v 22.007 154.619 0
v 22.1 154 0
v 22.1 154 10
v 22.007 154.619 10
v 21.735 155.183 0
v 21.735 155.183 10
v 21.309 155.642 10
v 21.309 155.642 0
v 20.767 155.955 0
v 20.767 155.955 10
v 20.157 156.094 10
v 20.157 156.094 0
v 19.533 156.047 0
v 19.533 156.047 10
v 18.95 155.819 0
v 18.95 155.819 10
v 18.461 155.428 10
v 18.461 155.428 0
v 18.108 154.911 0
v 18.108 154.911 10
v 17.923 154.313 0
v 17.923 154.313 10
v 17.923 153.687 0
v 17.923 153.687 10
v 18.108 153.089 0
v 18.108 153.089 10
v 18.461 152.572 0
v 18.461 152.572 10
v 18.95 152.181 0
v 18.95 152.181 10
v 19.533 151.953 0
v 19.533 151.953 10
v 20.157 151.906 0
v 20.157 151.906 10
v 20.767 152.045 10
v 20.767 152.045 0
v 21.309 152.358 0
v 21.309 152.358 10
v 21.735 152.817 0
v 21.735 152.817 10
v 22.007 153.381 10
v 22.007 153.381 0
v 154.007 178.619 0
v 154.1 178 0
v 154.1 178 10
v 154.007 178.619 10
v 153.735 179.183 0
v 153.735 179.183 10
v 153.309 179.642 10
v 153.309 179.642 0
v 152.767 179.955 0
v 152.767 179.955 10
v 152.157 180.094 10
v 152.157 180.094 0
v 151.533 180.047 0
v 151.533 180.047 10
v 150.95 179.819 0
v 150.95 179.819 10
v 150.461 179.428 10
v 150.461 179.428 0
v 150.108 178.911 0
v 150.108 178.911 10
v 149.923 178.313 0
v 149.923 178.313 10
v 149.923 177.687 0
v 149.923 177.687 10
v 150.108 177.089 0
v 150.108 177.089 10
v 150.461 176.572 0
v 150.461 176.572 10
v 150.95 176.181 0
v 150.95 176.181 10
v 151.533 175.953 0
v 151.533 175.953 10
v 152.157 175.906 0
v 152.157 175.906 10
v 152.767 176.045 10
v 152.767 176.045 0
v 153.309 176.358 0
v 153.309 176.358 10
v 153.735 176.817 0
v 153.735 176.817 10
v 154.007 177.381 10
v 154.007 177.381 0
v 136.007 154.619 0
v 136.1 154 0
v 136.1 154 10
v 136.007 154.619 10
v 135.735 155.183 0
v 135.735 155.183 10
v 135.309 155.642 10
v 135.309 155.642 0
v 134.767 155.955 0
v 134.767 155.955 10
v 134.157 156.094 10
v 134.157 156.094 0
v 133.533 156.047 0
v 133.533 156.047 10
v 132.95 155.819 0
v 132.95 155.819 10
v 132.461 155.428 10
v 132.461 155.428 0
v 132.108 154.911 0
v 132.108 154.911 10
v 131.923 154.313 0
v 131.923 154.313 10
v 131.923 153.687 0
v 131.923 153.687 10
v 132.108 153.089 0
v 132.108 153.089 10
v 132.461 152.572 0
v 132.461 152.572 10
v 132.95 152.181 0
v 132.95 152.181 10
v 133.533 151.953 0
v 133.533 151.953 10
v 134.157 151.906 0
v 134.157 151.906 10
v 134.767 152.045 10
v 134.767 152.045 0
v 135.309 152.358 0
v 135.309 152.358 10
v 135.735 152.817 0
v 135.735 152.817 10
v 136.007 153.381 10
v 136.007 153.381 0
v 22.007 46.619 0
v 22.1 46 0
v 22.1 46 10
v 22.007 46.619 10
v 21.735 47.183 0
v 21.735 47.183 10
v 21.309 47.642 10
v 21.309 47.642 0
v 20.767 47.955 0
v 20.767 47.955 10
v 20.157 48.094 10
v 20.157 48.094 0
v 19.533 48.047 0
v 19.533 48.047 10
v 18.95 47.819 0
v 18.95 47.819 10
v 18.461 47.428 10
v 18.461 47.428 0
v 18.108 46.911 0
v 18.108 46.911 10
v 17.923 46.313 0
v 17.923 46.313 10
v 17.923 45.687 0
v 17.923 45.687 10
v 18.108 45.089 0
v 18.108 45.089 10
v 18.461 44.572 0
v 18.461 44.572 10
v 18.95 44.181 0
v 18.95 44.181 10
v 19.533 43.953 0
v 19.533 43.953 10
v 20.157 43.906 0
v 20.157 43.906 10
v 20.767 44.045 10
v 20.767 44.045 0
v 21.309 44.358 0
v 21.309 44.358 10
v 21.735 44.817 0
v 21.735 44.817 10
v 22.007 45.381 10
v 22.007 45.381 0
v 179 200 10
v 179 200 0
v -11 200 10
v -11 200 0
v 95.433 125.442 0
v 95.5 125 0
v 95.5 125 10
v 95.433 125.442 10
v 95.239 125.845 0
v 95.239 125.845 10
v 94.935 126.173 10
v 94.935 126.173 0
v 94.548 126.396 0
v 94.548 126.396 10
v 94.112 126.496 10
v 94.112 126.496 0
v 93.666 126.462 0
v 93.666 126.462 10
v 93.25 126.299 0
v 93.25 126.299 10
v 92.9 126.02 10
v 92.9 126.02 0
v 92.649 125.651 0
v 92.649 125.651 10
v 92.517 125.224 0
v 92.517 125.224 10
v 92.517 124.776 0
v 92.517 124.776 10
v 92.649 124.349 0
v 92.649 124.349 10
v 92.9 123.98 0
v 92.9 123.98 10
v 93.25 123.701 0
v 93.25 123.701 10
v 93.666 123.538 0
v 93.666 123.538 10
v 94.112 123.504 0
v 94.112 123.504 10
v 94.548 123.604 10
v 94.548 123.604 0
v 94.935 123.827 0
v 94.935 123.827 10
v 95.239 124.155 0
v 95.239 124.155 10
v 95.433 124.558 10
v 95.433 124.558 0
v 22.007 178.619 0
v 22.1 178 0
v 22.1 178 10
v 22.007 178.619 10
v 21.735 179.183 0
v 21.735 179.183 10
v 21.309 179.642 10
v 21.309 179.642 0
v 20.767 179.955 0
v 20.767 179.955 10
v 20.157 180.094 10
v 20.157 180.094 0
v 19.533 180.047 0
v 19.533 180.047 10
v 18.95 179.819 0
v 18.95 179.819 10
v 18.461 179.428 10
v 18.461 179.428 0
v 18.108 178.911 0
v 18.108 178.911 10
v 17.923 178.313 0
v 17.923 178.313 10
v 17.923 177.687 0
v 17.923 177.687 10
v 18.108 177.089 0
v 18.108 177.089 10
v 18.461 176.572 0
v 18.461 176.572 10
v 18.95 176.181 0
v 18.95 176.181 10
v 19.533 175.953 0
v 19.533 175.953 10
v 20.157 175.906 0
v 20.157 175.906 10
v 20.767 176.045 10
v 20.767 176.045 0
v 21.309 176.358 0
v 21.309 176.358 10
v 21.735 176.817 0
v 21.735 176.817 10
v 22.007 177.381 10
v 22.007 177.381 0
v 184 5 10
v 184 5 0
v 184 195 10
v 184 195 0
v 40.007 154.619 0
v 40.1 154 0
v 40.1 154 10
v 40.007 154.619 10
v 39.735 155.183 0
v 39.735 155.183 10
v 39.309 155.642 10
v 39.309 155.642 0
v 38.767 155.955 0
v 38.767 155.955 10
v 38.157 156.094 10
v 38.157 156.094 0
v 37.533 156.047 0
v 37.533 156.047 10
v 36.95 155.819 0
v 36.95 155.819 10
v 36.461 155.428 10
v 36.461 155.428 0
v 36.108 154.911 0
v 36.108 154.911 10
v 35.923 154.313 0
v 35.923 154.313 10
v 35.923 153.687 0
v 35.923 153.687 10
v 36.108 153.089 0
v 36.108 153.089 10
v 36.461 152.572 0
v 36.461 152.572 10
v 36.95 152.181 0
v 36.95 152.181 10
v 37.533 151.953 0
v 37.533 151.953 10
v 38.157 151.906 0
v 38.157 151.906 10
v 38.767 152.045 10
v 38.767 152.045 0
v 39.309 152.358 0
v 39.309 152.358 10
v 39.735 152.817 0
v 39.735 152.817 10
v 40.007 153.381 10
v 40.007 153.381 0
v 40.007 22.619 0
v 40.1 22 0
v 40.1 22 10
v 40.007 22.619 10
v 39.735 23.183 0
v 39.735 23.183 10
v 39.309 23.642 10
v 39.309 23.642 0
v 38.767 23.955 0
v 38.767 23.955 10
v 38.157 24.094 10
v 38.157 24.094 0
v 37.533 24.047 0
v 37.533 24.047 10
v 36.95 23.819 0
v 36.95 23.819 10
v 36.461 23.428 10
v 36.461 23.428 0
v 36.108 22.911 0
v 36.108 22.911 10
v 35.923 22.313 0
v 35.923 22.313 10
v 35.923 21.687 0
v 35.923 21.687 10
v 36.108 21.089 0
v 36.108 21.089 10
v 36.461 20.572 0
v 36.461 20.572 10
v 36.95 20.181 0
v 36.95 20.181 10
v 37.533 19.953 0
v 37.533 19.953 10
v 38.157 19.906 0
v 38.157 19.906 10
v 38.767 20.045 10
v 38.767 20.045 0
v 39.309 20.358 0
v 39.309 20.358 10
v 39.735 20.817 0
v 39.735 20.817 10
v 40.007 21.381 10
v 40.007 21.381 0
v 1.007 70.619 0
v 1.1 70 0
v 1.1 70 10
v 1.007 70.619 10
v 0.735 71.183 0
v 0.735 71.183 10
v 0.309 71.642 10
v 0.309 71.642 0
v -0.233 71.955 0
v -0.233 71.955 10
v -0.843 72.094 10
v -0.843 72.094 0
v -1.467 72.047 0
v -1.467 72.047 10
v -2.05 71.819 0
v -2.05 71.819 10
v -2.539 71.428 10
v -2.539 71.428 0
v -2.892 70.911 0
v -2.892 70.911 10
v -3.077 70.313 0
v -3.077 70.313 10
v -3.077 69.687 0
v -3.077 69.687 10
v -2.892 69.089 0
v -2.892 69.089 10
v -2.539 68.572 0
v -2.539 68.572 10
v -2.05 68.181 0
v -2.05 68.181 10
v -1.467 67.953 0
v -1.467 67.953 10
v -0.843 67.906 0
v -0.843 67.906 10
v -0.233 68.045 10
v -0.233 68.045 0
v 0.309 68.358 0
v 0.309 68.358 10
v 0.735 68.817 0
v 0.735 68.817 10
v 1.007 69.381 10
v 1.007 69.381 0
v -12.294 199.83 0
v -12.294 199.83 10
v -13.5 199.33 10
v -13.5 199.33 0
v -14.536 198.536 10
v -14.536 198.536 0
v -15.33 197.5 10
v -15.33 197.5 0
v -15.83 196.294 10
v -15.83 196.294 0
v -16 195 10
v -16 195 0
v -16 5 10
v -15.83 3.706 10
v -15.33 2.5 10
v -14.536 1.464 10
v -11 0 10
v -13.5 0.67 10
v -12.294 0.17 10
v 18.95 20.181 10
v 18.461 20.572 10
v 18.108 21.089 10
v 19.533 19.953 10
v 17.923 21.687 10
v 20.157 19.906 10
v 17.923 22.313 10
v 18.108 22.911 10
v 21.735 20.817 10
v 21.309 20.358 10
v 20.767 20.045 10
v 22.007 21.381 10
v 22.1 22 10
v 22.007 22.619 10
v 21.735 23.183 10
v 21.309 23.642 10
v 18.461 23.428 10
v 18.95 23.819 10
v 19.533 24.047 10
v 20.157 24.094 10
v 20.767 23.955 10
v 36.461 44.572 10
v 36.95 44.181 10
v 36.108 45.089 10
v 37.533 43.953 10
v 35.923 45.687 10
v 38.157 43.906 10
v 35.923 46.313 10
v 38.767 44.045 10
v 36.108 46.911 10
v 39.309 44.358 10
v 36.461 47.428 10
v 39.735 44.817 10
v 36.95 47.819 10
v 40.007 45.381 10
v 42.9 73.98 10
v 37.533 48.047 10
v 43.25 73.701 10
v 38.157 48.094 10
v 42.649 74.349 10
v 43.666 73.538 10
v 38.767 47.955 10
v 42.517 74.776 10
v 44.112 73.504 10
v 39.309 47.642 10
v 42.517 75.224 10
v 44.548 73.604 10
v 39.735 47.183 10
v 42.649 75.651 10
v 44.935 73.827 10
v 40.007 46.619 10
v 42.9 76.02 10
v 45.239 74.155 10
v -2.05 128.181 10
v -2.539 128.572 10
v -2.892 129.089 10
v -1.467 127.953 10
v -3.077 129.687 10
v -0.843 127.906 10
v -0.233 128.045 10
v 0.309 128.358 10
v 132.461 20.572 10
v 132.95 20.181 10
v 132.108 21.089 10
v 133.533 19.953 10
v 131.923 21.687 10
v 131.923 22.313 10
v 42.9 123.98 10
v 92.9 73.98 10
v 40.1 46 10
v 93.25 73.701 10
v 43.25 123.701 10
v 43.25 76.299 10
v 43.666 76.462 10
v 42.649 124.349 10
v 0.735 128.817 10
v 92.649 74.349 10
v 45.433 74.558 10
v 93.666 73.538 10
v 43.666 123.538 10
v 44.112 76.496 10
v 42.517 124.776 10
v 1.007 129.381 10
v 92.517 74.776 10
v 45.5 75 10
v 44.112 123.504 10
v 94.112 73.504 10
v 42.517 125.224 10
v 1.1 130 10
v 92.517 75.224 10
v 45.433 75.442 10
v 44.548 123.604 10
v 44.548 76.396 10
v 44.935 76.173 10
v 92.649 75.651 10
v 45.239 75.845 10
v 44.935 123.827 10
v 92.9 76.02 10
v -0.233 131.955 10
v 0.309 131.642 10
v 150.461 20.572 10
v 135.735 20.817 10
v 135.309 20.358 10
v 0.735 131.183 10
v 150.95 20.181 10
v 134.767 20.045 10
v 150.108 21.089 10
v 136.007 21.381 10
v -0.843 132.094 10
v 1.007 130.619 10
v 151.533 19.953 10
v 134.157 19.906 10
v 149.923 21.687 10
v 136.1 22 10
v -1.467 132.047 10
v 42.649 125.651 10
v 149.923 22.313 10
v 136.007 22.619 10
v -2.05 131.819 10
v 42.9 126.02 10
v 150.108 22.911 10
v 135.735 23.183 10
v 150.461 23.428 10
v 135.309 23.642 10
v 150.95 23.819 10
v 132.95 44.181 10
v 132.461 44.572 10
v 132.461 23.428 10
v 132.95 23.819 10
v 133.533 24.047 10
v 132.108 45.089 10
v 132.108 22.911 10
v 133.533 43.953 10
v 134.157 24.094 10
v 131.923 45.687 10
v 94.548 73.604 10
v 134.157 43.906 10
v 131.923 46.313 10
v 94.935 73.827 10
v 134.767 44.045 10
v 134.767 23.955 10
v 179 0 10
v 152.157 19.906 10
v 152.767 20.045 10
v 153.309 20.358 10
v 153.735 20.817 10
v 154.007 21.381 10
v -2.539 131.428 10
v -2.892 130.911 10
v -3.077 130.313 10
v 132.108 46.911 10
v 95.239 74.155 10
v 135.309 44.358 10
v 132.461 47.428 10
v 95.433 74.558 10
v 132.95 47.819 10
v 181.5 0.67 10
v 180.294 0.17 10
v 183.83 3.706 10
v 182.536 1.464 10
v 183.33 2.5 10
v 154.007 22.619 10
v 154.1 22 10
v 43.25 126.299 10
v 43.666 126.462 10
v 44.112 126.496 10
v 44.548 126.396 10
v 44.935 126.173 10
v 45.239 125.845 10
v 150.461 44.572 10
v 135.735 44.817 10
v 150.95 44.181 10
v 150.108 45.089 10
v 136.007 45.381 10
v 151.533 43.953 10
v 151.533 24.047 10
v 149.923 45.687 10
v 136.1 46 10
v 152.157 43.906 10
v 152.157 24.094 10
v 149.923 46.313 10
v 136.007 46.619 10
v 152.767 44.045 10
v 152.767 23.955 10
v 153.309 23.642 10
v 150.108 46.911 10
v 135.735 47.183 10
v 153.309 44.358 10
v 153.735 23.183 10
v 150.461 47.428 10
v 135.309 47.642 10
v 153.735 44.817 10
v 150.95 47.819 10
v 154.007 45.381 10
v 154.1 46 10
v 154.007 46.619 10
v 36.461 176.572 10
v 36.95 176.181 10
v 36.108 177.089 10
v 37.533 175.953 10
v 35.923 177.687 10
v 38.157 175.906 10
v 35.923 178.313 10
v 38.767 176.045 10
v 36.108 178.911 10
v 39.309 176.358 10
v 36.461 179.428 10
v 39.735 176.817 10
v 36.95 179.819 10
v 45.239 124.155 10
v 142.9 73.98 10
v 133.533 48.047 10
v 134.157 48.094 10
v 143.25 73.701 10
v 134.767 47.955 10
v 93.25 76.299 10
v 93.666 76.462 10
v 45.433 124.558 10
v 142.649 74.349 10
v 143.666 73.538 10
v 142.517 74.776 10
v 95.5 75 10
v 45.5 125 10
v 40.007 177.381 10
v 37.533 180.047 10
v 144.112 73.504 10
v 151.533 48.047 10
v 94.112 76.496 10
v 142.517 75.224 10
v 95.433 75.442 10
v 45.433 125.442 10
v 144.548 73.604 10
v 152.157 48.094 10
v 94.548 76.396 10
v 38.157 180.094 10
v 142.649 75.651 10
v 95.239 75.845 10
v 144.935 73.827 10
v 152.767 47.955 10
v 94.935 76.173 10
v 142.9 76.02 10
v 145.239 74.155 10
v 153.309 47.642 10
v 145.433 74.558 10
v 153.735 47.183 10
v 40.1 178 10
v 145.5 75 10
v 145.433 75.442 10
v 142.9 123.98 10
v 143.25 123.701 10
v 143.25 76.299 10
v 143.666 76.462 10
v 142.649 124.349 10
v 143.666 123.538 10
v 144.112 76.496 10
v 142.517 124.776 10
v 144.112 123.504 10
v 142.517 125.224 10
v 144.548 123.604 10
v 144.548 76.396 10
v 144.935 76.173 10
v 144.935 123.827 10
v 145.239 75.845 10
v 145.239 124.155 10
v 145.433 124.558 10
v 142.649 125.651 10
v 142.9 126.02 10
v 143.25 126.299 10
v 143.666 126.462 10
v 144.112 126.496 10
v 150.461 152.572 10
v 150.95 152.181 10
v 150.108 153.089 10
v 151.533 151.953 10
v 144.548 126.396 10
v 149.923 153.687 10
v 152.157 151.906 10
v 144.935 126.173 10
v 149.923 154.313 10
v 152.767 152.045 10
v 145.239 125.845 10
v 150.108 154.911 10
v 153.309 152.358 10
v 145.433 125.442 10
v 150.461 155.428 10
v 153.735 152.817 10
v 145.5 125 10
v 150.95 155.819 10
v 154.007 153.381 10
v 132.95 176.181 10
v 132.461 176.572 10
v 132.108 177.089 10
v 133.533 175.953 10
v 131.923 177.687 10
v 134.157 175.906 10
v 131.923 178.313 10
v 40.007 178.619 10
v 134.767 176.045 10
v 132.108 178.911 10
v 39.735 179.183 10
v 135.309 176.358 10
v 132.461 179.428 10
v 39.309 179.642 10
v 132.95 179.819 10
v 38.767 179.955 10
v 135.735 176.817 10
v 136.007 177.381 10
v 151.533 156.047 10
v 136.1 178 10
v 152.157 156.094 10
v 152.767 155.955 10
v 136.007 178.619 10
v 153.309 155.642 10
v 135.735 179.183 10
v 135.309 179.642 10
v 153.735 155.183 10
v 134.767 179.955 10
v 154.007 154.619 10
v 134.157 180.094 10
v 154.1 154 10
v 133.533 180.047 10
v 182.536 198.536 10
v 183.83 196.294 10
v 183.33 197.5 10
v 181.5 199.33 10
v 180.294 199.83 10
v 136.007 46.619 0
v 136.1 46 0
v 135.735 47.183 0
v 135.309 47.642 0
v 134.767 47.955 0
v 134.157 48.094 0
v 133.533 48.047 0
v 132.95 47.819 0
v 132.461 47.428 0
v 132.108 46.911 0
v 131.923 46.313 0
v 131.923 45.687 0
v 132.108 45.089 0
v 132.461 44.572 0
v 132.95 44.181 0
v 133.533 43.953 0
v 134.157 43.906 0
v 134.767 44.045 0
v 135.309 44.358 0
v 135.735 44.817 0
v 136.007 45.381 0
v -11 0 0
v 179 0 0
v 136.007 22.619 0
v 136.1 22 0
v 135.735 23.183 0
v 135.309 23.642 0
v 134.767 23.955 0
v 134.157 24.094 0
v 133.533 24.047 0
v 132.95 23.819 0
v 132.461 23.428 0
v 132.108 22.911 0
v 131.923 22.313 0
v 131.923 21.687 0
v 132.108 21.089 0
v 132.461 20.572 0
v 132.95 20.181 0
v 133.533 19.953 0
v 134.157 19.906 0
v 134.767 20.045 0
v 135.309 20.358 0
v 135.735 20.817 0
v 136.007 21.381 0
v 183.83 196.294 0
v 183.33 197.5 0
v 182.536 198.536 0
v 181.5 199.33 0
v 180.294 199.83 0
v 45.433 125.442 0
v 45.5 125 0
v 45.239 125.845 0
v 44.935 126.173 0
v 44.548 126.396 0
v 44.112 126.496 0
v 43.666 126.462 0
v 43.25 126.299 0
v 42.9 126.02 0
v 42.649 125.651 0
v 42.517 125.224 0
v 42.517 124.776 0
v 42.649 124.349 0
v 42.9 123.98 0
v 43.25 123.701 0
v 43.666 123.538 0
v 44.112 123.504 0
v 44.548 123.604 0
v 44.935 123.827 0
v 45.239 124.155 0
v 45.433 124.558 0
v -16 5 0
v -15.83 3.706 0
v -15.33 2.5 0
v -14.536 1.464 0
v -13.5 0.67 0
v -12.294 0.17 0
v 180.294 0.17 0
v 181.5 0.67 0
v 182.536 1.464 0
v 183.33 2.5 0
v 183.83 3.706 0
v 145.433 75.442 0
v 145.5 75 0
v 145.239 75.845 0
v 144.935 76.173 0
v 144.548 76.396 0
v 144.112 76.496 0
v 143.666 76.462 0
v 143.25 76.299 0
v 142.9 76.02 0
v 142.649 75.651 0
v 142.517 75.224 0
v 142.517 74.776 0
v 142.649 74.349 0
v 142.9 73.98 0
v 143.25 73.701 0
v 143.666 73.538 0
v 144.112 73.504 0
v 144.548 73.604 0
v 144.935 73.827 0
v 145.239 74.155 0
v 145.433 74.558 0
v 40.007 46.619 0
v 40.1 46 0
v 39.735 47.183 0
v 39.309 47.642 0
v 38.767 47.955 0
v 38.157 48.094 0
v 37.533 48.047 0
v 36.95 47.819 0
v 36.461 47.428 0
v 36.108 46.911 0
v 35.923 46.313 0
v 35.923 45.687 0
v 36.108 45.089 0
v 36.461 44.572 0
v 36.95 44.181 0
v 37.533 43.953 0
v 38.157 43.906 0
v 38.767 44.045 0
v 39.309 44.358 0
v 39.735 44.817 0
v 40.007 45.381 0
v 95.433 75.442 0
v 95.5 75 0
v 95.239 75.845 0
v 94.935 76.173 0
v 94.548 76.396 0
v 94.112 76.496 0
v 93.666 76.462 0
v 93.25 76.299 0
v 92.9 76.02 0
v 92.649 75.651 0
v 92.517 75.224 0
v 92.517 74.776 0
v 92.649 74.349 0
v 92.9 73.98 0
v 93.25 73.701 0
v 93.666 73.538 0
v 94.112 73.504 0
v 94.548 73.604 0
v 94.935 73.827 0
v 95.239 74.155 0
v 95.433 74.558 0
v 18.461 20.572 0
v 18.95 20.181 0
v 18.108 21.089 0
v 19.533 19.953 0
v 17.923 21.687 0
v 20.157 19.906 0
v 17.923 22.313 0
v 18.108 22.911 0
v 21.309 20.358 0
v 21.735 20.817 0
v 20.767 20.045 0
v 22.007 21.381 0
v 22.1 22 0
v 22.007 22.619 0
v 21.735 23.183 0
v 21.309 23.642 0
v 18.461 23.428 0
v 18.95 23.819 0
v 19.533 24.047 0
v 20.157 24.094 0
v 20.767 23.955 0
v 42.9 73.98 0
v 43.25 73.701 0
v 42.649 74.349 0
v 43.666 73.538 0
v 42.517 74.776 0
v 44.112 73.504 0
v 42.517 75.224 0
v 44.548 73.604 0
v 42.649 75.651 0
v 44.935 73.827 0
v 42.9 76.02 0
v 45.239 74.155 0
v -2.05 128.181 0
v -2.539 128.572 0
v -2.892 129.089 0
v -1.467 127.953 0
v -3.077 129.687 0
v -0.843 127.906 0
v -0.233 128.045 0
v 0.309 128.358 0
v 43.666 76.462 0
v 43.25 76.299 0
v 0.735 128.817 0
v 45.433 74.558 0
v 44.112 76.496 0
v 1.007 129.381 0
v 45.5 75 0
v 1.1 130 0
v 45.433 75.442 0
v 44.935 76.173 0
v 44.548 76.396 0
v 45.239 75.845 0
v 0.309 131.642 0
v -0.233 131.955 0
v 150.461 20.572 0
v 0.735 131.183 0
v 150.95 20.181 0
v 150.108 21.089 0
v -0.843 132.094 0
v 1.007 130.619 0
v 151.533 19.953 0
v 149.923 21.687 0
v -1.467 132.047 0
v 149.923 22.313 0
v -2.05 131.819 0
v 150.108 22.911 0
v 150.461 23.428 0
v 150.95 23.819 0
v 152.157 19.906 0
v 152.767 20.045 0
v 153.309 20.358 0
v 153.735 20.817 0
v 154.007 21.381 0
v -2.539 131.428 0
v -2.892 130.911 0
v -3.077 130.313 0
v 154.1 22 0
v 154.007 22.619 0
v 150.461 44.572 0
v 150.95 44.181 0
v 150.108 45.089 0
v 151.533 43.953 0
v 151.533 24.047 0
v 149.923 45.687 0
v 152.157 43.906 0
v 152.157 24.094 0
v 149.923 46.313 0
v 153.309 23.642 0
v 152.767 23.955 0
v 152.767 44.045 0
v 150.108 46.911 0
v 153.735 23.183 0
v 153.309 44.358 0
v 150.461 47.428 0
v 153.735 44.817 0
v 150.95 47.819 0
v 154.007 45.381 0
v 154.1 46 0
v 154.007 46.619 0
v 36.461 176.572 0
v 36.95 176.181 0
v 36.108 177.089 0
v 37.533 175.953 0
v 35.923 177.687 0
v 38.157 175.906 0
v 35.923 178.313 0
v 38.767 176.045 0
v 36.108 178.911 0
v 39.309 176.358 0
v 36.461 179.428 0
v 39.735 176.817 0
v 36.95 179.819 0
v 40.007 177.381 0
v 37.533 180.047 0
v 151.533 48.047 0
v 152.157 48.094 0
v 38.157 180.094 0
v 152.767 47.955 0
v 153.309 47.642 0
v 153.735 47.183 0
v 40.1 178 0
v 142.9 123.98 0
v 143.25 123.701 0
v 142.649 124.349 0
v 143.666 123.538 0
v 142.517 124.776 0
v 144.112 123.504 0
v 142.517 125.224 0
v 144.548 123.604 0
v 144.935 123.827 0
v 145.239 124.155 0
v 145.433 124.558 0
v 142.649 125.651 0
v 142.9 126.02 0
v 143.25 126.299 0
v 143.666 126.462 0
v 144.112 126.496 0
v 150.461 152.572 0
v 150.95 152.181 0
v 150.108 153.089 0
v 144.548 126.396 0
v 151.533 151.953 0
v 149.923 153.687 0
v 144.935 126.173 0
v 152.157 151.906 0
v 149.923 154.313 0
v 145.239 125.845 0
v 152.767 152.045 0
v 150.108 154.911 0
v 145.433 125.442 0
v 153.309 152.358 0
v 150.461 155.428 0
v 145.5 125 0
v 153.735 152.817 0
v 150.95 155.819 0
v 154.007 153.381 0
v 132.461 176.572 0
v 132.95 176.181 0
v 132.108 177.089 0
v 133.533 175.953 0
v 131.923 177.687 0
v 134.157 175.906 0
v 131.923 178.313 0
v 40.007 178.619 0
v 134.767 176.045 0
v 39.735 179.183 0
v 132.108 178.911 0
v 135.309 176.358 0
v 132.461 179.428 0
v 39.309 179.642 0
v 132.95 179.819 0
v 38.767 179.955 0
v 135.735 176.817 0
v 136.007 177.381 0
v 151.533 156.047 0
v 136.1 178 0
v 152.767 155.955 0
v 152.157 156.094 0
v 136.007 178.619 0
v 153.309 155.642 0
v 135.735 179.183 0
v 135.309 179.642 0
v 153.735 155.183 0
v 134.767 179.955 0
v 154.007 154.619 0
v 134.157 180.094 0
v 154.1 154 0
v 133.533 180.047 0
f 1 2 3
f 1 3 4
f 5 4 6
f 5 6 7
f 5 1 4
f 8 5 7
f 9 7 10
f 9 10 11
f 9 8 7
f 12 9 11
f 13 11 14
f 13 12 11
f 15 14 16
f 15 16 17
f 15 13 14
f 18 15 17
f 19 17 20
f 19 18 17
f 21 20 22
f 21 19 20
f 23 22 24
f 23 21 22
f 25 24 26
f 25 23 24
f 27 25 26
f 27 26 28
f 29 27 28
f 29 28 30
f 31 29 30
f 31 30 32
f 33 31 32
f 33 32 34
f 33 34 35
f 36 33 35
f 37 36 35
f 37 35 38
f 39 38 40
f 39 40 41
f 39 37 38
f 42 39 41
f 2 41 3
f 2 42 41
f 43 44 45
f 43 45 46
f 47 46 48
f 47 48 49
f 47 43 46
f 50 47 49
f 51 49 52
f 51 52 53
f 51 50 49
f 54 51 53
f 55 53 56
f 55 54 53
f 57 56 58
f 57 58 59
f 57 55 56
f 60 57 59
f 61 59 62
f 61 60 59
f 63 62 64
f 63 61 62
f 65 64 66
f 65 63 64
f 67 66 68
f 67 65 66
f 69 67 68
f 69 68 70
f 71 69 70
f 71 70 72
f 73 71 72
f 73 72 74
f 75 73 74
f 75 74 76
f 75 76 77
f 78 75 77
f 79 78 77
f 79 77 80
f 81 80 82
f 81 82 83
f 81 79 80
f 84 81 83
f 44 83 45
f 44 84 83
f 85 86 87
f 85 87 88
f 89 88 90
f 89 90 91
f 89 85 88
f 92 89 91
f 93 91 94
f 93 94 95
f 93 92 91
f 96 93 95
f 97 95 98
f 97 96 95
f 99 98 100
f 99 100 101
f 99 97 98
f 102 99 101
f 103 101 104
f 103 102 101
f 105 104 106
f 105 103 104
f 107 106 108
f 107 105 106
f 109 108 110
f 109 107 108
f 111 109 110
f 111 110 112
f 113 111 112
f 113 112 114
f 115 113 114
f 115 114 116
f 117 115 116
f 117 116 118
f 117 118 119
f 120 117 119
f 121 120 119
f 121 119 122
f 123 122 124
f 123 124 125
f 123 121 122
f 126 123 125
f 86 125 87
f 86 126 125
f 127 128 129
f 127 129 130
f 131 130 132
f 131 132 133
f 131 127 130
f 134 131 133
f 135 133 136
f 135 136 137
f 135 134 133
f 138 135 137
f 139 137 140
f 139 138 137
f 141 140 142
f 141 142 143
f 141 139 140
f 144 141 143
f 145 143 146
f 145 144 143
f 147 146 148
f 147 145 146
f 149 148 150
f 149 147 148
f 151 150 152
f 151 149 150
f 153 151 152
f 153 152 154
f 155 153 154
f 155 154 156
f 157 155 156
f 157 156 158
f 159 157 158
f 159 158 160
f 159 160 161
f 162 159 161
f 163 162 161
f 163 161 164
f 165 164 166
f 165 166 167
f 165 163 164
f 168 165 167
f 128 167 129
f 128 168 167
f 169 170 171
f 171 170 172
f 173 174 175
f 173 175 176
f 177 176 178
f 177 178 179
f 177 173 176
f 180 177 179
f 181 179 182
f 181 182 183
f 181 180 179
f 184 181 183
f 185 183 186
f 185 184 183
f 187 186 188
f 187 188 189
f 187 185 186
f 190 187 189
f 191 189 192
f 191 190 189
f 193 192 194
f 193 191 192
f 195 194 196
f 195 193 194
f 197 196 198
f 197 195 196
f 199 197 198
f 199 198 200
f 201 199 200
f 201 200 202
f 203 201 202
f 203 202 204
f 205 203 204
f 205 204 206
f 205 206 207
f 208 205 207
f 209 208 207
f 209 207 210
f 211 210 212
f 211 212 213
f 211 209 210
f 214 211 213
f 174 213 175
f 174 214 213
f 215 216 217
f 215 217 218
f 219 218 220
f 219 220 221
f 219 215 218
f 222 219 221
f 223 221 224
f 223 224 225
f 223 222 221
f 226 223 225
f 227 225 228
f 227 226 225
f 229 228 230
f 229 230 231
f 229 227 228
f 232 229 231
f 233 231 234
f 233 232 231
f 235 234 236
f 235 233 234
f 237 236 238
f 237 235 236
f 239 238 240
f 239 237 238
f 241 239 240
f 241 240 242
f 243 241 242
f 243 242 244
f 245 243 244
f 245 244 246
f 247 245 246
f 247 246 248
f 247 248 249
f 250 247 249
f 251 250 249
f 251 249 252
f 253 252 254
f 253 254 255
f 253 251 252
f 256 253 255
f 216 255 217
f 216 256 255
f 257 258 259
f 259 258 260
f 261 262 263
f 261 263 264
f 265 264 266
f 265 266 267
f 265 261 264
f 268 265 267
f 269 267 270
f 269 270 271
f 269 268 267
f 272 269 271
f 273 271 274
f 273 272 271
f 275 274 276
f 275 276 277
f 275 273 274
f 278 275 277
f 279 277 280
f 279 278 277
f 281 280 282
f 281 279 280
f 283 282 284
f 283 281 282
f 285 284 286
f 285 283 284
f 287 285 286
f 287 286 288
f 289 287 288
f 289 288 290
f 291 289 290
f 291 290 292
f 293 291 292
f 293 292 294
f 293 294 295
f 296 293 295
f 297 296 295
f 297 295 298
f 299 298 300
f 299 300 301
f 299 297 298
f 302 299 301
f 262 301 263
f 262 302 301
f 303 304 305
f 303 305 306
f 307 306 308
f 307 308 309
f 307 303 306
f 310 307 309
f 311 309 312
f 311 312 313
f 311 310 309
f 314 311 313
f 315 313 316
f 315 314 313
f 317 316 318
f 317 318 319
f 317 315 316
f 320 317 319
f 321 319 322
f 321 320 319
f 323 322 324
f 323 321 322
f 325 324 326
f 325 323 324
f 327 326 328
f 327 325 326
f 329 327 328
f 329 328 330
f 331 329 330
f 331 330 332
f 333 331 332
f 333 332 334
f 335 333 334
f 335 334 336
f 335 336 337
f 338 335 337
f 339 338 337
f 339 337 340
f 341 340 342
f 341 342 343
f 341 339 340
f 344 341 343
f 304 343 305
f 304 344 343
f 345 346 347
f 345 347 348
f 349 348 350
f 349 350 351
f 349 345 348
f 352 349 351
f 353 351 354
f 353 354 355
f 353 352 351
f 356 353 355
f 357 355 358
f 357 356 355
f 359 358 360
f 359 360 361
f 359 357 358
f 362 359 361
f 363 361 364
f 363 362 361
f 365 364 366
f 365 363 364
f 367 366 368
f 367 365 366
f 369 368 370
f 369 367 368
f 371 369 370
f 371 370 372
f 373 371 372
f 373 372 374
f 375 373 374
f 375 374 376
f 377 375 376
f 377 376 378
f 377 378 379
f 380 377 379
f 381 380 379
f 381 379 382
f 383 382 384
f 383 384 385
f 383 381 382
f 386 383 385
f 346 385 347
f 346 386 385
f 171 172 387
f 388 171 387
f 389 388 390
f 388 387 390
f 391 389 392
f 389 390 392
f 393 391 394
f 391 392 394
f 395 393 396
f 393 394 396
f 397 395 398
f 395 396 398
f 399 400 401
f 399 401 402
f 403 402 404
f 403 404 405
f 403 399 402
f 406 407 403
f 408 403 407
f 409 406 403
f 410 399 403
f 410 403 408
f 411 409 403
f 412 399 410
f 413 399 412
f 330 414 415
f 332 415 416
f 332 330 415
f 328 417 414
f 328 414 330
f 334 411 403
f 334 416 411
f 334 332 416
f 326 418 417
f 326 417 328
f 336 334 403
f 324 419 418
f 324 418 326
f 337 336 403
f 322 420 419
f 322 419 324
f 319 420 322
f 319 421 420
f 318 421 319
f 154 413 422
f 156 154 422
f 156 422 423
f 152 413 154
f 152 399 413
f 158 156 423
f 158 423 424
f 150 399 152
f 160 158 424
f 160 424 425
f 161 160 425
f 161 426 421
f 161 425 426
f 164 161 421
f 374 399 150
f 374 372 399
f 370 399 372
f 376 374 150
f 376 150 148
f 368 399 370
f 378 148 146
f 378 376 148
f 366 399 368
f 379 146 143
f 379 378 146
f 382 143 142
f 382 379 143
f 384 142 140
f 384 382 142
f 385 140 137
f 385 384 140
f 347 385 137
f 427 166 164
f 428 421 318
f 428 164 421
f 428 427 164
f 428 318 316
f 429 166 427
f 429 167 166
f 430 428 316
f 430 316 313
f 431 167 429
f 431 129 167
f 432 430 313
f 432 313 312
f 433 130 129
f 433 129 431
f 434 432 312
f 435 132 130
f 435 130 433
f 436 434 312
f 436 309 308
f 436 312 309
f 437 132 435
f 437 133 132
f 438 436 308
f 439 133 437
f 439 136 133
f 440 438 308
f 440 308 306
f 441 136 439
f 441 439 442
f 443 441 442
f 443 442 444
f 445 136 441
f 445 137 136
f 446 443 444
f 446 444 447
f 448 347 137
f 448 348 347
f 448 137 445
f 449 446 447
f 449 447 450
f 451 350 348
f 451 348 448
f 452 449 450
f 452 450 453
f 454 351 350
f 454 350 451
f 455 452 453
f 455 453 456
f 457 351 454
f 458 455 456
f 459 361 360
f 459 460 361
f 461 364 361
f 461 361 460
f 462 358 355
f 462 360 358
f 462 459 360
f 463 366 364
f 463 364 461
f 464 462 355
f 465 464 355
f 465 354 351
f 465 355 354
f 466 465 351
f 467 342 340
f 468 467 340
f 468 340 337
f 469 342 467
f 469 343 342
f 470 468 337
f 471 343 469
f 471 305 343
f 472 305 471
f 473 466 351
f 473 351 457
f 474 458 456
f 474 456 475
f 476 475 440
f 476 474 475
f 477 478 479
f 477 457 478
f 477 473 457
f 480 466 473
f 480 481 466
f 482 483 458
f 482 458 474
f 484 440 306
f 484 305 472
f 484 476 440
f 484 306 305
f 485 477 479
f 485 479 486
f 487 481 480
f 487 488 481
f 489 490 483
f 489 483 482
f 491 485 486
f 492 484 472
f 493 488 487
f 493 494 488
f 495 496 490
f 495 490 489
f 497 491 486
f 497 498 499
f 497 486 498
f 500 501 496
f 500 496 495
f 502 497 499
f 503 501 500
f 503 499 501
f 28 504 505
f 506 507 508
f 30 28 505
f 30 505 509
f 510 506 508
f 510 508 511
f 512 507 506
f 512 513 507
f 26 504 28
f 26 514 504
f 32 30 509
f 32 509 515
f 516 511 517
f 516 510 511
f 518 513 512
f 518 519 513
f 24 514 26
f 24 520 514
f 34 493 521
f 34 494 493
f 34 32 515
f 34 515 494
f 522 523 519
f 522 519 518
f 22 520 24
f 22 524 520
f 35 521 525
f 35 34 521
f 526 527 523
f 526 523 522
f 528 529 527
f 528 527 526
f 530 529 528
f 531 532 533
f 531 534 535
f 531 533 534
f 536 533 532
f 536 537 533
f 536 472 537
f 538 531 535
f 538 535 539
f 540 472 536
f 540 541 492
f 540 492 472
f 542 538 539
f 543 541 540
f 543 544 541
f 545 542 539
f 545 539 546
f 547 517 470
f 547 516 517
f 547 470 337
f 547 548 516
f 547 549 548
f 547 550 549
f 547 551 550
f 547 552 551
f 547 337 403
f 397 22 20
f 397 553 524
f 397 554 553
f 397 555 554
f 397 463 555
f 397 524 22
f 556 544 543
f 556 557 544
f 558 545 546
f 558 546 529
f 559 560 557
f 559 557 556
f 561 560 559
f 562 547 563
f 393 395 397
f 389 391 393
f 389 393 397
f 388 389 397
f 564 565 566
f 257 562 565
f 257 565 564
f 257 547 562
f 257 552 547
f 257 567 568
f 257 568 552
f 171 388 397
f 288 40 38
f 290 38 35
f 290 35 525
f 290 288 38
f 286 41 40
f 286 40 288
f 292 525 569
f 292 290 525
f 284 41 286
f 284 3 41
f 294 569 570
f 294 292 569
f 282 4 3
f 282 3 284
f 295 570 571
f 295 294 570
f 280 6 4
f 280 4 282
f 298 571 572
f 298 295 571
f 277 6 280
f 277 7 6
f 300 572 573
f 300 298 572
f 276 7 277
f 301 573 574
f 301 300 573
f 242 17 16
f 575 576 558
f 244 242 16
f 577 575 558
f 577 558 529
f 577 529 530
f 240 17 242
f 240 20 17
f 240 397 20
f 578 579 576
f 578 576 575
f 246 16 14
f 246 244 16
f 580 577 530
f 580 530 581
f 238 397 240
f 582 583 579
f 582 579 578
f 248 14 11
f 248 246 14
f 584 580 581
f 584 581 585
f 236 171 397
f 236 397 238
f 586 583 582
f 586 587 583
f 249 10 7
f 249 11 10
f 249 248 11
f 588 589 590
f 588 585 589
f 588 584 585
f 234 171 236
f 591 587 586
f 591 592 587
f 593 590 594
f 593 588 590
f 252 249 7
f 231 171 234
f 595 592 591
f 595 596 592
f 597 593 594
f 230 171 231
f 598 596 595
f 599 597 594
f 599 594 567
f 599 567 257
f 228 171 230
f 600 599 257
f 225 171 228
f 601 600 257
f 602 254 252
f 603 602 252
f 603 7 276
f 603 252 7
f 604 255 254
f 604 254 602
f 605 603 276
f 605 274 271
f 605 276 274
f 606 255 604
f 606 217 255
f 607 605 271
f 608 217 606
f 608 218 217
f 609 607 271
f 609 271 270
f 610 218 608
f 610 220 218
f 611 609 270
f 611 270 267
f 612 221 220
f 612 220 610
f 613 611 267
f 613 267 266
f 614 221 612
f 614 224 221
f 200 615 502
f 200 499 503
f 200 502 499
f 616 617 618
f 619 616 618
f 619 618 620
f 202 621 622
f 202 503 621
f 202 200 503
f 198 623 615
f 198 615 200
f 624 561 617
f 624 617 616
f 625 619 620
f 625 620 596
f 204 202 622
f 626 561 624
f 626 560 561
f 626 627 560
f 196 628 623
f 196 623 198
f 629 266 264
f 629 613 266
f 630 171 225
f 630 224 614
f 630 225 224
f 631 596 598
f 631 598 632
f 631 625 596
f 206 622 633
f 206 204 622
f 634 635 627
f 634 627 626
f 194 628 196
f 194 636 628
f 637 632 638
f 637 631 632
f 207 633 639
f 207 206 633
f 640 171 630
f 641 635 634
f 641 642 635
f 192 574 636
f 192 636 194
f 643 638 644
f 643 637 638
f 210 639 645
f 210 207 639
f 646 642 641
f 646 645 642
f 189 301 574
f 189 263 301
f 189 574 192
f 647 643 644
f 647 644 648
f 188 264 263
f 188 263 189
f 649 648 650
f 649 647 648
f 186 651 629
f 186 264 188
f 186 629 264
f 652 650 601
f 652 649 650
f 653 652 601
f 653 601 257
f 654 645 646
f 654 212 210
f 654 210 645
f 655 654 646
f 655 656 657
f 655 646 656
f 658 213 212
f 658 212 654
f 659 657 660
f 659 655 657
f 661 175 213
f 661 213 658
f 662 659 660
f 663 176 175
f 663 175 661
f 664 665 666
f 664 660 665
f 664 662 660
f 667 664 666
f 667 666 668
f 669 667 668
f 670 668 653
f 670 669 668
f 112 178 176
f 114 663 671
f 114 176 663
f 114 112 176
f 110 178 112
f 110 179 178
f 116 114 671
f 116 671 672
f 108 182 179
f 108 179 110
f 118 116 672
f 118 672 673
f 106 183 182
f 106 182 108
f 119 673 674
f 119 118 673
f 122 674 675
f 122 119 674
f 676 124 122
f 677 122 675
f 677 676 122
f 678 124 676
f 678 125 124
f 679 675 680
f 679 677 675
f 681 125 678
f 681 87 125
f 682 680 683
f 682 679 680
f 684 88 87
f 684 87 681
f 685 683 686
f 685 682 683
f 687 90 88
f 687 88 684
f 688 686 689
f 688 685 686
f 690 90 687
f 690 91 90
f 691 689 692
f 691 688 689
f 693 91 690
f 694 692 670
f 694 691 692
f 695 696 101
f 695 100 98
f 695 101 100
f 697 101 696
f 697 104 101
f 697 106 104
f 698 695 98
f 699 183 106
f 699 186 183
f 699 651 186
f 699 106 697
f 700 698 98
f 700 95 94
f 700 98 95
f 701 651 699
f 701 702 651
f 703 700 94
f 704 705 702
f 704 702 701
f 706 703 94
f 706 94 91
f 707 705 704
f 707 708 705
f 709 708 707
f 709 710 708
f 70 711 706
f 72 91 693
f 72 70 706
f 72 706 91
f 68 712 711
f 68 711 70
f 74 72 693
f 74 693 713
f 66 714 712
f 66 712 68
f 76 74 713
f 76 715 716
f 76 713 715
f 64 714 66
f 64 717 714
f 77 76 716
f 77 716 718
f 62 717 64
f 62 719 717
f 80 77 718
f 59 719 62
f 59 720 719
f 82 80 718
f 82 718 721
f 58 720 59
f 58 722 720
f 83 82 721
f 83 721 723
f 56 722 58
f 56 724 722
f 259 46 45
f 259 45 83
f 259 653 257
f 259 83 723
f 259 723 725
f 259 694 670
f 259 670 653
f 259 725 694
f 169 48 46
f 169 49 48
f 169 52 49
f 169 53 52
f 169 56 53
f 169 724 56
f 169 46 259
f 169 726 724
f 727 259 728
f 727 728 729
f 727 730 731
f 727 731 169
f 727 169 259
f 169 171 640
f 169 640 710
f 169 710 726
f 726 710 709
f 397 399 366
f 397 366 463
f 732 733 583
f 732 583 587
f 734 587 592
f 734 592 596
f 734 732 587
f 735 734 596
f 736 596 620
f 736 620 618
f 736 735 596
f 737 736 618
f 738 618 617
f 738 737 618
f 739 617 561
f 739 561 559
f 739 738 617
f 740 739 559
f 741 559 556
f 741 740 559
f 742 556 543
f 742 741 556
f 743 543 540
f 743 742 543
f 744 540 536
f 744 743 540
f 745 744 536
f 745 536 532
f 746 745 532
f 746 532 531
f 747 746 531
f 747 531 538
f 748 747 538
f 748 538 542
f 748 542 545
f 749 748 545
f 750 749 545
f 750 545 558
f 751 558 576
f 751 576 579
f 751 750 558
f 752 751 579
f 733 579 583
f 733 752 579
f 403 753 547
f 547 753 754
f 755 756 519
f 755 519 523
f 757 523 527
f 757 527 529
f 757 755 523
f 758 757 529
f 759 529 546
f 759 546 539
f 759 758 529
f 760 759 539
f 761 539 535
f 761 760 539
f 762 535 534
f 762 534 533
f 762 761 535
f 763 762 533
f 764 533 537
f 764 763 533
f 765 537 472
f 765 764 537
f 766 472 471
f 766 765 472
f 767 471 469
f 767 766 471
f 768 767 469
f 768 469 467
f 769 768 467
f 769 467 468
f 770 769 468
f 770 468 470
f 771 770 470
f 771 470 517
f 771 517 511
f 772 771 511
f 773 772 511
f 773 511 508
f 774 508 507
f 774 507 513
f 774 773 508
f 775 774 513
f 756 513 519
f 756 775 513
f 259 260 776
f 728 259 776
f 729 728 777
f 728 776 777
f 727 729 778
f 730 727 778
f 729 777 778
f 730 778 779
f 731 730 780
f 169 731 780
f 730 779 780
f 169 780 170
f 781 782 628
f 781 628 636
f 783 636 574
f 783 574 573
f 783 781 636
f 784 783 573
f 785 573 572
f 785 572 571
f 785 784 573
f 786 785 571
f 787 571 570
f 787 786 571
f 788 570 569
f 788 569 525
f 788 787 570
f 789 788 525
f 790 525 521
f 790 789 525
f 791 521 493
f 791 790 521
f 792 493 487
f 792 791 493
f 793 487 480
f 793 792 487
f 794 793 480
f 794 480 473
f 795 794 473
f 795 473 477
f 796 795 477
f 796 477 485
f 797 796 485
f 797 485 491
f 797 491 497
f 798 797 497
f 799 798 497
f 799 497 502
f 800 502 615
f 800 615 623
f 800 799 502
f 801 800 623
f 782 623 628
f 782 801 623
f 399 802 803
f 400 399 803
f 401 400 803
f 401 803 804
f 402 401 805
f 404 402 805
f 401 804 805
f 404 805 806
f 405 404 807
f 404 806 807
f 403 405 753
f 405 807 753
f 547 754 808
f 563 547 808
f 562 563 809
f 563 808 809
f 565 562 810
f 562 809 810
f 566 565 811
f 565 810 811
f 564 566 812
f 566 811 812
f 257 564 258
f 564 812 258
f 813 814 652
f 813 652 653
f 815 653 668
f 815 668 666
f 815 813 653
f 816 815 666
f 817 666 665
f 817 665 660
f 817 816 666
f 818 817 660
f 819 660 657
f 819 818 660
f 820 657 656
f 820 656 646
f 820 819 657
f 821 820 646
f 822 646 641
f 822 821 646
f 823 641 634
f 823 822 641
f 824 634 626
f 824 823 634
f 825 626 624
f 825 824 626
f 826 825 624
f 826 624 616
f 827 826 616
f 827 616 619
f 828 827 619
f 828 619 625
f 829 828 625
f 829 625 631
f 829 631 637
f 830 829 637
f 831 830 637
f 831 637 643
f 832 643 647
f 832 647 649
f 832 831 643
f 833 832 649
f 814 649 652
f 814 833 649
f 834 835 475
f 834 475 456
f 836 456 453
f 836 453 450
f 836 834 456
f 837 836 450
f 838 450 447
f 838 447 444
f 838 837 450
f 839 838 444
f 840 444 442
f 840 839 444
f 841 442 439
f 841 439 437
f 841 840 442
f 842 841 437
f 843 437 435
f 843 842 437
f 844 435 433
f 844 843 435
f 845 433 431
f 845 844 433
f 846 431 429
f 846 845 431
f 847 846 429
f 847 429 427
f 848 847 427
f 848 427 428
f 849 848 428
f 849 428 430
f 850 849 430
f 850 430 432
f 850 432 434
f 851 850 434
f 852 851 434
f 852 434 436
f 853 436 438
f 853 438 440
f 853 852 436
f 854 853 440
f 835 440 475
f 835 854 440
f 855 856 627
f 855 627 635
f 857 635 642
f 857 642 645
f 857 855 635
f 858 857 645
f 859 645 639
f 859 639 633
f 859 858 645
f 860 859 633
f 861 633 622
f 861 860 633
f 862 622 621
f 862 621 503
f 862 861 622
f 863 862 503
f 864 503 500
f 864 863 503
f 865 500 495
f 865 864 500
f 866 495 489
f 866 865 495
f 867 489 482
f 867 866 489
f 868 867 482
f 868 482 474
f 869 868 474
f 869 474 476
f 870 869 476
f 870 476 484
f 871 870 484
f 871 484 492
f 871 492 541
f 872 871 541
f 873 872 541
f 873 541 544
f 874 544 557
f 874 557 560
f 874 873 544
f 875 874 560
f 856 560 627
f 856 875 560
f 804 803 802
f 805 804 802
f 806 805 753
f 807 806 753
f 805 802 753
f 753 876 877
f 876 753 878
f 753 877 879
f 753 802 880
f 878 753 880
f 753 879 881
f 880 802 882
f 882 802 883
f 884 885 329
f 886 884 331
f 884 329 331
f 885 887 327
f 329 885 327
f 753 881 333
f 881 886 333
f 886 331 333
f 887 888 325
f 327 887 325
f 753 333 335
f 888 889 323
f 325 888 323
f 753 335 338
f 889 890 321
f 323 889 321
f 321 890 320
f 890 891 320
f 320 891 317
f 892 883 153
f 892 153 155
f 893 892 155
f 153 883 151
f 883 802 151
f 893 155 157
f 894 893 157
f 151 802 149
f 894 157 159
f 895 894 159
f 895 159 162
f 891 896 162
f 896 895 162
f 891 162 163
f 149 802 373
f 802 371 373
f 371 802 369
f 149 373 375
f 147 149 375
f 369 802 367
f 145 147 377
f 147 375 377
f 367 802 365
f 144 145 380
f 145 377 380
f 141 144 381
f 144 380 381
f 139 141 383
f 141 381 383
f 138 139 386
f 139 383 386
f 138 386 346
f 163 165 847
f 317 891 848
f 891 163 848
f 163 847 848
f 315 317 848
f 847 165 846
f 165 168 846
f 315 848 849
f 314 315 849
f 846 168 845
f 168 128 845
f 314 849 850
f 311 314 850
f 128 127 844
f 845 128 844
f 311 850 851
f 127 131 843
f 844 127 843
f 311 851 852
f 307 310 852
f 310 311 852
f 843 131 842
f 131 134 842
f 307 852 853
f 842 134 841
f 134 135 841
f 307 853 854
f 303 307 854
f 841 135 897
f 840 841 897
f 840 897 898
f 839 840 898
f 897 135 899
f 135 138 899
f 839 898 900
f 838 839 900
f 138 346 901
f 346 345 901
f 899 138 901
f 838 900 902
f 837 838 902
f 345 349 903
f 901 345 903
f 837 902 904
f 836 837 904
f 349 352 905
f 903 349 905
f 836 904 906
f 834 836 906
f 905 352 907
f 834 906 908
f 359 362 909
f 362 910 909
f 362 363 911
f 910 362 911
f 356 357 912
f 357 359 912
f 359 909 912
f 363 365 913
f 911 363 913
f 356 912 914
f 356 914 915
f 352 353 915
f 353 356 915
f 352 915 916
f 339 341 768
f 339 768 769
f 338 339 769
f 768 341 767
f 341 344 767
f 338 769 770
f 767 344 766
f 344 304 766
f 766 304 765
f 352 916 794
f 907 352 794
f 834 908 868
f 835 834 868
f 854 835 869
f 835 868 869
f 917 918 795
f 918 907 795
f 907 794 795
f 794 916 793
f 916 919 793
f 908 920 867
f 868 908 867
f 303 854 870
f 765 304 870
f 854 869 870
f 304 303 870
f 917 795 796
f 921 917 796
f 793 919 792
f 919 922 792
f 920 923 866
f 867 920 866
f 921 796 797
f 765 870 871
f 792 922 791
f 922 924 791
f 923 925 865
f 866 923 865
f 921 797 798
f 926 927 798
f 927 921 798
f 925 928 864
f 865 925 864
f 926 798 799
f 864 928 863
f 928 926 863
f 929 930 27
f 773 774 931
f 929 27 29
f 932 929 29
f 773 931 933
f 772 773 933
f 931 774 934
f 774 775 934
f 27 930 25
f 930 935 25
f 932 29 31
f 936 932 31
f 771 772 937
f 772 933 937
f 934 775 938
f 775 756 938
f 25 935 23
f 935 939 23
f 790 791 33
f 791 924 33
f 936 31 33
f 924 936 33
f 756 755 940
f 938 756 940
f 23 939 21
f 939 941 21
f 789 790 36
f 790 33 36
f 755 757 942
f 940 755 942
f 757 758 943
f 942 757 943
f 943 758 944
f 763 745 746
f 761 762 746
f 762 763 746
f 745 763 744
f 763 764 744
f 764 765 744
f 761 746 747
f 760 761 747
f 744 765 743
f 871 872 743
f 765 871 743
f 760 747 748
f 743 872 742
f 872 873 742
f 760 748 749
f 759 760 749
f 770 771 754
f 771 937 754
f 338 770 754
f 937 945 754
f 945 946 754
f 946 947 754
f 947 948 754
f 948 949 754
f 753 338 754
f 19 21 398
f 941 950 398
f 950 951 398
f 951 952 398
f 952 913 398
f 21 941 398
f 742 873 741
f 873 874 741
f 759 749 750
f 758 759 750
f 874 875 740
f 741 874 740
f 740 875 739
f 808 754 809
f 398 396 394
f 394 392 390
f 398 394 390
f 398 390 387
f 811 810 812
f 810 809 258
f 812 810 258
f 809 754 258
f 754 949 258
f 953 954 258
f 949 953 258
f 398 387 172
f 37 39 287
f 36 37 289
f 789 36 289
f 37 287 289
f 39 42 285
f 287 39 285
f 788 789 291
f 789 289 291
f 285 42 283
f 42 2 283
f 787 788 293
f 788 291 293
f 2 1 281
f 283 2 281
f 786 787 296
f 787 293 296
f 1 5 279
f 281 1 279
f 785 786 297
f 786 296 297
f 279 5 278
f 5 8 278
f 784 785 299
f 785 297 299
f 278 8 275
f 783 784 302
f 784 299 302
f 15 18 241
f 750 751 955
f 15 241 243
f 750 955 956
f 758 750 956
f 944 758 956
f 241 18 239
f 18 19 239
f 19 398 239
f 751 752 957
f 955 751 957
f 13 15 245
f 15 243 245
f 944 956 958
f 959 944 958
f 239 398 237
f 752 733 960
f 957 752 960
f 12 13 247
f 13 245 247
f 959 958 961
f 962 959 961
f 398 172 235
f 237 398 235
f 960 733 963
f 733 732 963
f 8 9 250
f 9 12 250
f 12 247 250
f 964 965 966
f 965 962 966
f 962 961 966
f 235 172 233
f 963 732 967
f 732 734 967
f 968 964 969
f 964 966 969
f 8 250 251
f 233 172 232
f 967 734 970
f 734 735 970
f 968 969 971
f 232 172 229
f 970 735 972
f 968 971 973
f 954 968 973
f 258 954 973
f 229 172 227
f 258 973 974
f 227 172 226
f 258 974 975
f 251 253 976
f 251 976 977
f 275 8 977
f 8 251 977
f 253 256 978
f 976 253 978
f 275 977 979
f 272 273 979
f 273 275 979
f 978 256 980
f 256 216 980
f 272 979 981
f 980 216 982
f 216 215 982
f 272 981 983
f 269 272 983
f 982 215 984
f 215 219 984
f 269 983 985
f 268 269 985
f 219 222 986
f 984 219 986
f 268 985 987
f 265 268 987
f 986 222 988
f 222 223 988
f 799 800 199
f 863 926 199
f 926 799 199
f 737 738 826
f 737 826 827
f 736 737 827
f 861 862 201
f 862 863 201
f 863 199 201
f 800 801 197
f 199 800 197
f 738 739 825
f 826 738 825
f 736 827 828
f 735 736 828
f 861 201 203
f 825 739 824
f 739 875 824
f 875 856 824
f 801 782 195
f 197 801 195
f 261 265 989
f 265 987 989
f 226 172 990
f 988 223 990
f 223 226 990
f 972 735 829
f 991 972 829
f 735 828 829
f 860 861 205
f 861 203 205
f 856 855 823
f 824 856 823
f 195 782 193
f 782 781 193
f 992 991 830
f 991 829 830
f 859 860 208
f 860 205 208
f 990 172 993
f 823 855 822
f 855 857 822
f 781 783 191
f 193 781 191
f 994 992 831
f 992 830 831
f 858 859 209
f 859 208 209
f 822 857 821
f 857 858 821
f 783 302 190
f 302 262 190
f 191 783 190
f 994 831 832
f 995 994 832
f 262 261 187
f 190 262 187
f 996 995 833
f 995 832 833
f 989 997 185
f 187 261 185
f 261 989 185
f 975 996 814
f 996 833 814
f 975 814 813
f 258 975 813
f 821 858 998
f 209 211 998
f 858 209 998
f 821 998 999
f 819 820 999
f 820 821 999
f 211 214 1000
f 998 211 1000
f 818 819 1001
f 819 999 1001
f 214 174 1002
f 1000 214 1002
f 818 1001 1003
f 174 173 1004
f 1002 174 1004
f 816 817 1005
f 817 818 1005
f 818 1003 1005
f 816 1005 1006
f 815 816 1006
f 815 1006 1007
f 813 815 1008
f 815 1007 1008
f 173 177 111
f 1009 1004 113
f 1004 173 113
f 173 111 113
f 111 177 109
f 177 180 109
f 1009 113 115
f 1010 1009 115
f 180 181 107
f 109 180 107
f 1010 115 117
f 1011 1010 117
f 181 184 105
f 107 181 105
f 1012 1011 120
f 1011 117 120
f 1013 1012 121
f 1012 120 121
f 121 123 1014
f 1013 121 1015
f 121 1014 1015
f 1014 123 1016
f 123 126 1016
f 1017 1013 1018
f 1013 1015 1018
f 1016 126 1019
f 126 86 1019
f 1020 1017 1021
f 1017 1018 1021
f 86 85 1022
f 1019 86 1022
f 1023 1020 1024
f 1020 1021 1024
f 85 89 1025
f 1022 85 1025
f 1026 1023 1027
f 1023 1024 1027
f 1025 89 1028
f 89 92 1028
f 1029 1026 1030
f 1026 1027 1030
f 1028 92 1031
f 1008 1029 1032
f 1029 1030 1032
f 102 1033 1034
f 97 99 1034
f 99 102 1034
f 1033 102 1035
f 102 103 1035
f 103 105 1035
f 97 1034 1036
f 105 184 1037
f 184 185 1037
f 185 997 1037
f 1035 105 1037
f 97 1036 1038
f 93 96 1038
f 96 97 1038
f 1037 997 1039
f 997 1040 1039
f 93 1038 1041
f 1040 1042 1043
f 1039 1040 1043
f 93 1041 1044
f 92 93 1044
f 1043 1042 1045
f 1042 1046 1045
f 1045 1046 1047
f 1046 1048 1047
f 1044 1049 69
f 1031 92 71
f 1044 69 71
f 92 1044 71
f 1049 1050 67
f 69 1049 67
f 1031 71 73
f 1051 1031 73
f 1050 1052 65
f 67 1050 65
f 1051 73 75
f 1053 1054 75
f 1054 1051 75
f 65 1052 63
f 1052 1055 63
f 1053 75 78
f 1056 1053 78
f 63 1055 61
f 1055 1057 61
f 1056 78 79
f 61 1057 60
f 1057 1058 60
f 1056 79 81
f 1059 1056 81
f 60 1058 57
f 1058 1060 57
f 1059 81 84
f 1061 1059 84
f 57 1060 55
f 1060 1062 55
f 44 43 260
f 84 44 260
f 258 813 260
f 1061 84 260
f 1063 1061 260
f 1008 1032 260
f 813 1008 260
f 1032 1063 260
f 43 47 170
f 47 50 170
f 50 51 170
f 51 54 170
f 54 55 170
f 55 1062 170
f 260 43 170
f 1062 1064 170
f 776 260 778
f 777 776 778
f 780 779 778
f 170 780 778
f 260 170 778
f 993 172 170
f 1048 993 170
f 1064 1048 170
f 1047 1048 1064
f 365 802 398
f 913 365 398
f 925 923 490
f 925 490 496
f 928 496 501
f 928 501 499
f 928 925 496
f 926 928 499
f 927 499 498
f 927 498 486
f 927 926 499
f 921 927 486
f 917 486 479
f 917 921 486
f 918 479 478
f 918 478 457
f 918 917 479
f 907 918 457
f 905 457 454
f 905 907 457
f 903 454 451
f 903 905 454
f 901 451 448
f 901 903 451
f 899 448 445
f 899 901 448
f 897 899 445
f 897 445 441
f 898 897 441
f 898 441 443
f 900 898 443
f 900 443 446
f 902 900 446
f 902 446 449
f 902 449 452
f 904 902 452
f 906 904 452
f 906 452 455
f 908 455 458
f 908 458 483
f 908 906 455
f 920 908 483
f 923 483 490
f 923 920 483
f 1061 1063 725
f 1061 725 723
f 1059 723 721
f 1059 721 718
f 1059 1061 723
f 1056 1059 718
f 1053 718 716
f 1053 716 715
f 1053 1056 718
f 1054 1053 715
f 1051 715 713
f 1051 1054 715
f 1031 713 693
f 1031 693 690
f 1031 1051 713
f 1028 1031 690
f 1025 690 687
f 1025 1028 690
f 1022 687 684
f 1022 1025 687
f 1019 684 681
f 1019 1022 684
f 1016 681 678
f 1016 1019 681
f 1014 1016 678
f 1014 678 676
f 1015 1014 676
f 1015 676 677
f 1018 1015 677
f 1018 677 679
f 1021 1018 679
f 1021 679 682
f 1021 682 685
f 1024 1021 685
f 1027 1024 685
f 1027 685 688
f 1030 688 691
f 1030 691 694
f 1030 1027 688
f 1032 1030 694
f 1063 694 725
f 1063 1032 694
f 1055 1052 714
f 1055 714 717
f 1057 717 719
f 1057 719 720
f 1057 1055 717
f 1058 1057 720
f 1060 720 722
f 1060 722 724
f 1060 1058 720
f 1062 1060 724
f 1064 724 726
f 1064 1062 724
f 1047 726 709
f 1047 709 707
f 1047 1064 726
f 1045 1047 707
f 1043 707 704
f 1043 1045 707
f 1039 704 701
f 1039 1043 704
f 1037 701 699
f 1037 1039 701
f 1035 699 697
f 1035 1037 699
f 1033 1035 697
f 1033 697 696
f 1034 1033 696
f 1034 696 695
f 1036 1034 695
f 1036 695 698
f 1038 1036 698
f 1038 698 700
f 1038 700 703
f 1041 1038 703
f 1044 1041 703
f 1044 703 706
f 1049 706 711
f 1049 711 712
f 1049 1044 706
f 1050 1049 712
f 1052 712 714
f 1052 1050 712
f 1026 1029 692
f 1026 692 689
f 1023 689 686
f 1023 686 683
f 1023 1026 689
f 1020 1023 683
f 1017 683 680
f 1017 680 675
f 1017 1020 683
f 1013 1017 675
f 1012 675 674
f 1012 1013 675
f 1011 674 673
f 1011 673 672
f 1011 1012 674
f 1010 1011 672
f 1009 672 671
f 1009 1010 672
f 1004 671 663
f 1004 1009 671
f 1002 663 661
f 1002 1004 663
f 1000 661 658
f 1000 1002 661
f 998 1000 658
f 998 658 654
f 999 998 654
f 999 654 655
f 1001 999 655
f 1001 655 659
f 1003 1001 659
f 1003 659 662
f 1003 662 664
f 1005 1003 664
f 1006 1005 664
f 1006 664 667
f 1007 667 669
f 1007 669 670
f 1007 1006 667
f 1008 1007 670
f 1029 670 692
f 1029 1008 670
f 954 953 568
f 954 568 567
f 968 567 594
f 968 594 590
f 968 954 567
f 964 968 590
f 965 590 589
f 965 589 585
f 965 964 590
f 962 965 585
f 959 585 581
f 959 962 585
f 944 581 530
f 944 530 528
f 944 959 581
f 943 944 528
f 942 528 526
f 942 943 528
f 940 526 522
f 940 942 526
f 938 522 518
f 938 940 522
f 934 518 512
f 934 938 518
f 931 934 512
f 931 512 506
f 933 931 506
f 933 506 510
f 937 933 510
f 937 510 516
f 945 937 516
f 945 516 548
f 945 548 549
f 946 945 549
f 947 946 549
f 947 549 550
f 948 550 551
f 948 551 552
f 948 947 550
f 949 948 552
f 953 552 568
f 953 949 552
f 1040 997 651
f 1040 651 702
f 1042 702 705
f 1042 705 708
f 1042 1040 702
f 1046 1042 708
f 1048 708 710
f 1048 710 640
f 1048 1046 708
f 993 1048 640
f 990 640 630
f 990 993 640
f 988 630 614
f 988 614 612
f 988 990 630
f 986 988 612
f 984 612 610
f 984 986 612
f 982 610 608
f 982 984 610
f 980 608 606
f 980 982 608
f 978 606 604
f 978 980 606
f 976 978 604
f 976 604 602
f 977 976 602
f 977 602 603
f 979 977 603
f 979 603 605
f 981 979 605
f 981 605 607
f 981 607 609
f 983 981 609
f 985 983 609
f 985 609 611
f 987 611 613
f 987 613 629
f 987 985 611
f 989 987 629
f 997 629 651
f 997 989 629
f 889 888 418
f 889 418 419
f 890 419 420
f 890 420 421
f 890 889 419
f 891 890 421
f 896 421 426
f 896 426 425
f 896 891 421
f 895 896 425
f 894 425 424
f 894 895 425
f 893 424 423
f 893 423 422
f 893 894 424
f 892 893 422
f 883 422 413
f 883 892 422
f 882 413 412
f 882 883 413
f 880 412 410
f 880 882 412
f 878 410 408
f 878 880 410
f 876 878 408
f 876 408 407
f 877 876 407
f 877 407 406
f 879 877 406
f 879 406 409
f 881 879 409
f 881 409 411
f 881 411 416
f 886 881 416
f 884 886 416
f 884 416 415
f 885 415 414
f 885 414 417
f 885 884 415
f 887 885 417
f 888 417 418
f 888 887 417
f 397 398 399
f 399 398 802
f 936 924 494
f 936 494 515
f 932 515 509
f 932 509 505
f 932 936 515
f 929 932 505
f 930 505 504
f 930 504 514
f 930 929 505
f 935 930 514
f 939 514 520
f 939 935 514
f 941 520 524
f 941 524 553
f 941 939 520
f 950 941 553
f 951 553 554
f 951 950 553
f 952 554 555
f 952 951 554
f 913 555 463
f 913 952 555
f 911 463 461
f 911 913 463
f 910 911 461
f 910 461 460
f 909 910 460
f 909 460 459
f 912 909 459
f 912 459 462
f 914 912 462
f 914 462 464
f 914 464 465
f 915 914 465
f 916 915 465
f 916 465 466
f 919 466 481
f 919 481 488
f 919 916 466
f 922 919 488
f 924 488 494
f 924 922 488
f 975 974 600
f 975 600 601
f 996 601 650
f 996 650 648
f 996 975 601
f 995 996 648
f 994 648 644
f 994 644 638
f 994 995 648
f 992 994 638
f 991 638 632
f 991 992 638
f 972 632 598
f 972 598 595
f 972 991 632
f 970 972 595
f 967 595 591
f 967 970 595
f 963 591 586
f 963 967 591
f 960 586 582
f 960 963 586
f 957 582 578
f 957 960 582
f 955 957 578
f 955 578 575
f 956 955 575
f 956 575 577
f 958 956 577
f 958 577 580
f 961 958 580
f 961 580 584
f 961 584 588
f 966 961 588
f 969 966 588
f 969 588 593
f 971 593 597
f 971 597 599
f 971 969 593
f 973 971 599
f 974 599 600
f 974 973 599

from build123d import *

# Parameters (mm, degrees)
SKETCH2_R           = 2.1
SKETCH2_R_2         = 1.5
BOSS_EXTRUDE1_DEPTH = 10


with BuildPart() as part:
    # Sketch2 → Boss-Extrude1 (new body)
    with BuildSketch(Plane.XY):
        with BuildLine():
            Line((-11, 0), (179, 0))
            ThreePointArc((179, 0), (182.535533906, 1.464466094), (184, 5))
            Line((184, 5), (184, 195))
            ThreePointArc((184, 195), (182.535533906, 198.535533906), (179, 200))
            Line((179, 200), (-11, 200))
            ThreePointArc((-11, 200), (-14.535533906, 198.535533906), (-16, 195))
            Line((-16, 195), (-16, 5))
            ThreePointArc((-16, 5), (-14.535533906, 1.464466094), (-11, 0))
        make_face()
        with Locations((-1, 70)):
            Circle(SKETCH2_R, mode=Mode.SUBTRACT)
        with Locations((152, 178)):
            Circle(SKETCH2_R, mode=Mode.SUBTRACT)
        with Locations((152, 154)):
            Circle(SKETCH2_R, mode=Mode.SUBTRACT)
        with Locations((152, 22)):
            Circle(SKETCH2_R, mode=Mode.SUBTRACT)
        with Locations((152, 46)):
            Circle(SKETCH2_R, mode=Mode.SUBTRACT)
        with Locations((20, 178)):
            Circle(SKETCH2_R, mode=Mode.SUBTRACT)
        with Locations((38, 154)):
            Circle(SKETCH2_R, mode=Mode.SUBTRACT)
        with Locations((20, 22)):
            Circle(SKETCH2_R, mode=Mode.SUBTRACT)
        with Locations((38, 46)):
            Circle(SKETCH2_R, mode=Mode.SUBTRACT)
        with Locations((20, 46)):
            Circle(SKETCH2_R, mode=Mode.SUBTRACT)
        with Locations((38, 22)):
            Circle(SKETCH2_R, mode=Mode.SUBTRACT)
        with Locations((38, 178)):
            Circle(SKETCH2_R, mode=Mode.SUBTRACT)
        with Locations((20, 154)):
            Circle(SKETCH2_R, mode=Mode.SUBTRACT)
        with Locations((134, 46)):
            Circle(SKETCH2_R, mode=Mode.SUBTRACT)
        with Locations((134, 22)):
            Circle(SKETCH2_R, mode=Mode.SUBTRACT)
        with Locations((134, 154)):
            Circle(SKETCH2_R, mode=Mode.SUBTRACT)
        with Locations((134, 178)):
            Circle(SKETCH2_R, mode=Mode.SUBTRACT)
        with Locations((-1, 130)):
            Circle(SKETCH2_R, mode=Mode.SUBTRACT)
        with Locations((144, 125)):
            Circle(SKETCH2_R_2, mode=Mode.SUBTRACT)
        with Locations((144, 75)):
            Circle(SKETCH2_R_2, mode=Mode.SUBTRACT)
        with Locations((94, 125)):
            Circle(SKETCH2_R_2, mode=Mode.SUBTRACT)
        with Locations((94, 75)):
            Circle(SKETCH2_R_2, mode=Mode.SUBTRACT)
        with Locations((44, 125)):
            Circle(SKETCH2_R_2, mode=Mode.SUBTRACT)
        with Locations((44, 75)):
            Circle(SKETCH2_R_2, mode=Mode.SUBTRACT)
    extrude(amount=BOSS_EXTRUDE1_DEPTH)


solid = part.part
